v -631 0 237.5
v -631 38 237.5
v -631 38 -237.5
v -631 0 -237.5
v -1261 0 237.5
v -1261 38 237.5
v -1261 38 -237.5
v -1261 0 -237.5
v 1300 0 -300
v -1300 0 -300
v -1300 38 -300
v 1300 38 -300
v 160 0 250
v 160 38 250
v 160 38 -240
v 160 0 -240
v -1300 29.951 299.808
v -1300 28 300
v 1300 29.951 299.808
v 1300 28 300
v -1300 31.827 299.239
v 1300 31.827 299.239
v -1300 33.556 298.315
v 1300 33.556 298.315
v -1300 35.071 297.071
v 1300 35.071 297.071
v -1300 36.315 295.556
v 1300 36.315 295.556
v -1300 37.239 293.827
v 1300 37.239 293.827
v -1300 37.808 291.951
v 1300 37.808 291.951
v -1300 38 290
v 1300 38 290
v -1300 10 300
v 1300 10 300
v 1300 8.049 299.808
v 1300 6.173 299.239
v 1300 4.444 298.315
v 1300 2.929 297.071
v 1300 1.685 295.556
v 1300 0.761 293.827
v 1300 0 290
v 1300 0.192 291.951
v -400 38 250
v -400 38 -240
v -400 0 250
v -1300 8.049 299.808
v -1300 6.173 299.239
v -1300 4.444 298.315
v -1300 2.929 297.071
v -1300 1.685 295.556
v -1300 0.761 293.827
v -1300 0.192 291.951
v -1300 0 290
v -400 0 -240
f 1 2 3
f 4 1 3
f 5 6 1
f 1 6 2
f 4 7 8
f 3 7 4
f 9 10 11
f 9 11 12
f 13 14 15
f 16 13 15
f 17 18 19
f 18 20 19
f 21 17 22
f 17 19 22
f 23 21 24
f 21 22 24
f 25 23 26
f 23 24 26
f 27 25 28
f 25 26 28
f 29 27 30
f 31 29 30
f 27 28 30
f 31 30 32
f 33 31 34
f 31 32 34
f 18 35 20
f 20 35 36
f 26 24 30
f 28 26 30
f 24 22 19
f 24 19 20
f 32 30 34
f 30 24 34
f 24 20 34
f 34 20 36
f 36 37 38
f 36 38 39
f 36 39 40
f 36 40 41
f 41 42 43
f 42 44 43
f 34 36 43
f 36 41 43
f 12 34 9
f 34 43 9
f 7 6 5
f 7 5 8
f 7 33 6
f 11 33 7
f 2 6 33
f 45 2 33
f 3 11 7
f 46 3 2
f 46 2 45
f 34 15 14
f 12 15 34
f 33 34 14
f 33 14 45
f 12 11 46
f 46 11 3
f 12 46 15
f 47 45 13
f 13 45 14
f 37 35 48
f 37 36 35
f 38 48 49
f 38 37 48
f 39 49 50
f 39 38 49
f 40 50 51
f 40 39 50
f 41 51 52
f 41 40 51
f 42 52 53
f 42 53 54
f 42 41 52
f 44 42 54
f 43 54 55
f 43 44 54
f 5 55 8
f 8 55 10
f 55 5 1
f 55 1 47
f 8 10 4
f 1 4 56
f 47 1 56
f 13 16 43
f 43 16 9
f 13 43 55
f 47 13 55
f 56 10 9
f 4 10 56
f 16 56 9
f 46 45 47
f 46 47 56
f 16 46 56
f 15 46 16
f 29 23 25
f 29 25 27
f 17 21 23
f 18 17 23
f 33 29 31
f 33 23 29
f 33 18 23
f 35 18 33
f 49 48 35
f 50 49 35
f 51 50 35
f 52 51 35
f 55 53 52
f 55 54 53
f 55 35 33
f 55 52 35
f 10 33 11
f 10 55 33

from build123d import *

# Parameters (mm, degrees)
SKETCH_1_W               = 2600
SKETCH_1_H               = 600
EXTRUDE_1_DEPTH          = 38
FILLET_1_R               = 10
SKETCH_2_W               = 560
SKETCH_2_H               = 490
SKETCH_2_W_2             = 630
SKETCH_2_H_2             = 475
CUT_EXTRUDE_1_DEPTH      = 1
CUT_EXTRUDE_1_DEPTH_BACK = 39


with BuildPart() as part:
    # Эскиз1 → Бобышка-Вытянуть1 (new body)
    with BuildSketch(Plane(origin=(0, 0, 0), x_dir=(1, 0, 0), z_dir=(0, 1, 0))):
        Rectangle(SKETCH_1_W, SKETCH_1_H)
    extrude(amount=EXTRUDE_1_DEPTH)

    # Скругление1
    fillet_1_edges = [part.edges().sort_by_distance(p)[0] for p in [
        (0, 0, 300),
        (0, 38, 300),
    ]]
    fillet(fillet_1_edges, radius=FILLET_1_R)

    # Эскиз2 → Вырез-Вытянуть1 (cut, two sides)
    with BuildSketch(Plane(origin=(0, 38, 0), x_dir=(1, 0, 0), z_dir=(0, 1, 0))) as cut_extrude_1_sk:
        with Locations((-120, -5)):
            Rectangle(SKETCH_2_W, SKETCH_2_H)
        with Locations((-946, 0)):
            Rectangle(SKETCH_2_W_2, SKETCH_2_H_2)
    extrude(amount=CUT_EXTRUDE_1_DEPTH, mode=Mode.SUBTRACT)
    extrude(cut_extrude_1_sk.sketch, amount=-CUT_EXTRUDE_1_DEPTH_BACK, mode=Mode.SUBTRACT)


solid = part.part
